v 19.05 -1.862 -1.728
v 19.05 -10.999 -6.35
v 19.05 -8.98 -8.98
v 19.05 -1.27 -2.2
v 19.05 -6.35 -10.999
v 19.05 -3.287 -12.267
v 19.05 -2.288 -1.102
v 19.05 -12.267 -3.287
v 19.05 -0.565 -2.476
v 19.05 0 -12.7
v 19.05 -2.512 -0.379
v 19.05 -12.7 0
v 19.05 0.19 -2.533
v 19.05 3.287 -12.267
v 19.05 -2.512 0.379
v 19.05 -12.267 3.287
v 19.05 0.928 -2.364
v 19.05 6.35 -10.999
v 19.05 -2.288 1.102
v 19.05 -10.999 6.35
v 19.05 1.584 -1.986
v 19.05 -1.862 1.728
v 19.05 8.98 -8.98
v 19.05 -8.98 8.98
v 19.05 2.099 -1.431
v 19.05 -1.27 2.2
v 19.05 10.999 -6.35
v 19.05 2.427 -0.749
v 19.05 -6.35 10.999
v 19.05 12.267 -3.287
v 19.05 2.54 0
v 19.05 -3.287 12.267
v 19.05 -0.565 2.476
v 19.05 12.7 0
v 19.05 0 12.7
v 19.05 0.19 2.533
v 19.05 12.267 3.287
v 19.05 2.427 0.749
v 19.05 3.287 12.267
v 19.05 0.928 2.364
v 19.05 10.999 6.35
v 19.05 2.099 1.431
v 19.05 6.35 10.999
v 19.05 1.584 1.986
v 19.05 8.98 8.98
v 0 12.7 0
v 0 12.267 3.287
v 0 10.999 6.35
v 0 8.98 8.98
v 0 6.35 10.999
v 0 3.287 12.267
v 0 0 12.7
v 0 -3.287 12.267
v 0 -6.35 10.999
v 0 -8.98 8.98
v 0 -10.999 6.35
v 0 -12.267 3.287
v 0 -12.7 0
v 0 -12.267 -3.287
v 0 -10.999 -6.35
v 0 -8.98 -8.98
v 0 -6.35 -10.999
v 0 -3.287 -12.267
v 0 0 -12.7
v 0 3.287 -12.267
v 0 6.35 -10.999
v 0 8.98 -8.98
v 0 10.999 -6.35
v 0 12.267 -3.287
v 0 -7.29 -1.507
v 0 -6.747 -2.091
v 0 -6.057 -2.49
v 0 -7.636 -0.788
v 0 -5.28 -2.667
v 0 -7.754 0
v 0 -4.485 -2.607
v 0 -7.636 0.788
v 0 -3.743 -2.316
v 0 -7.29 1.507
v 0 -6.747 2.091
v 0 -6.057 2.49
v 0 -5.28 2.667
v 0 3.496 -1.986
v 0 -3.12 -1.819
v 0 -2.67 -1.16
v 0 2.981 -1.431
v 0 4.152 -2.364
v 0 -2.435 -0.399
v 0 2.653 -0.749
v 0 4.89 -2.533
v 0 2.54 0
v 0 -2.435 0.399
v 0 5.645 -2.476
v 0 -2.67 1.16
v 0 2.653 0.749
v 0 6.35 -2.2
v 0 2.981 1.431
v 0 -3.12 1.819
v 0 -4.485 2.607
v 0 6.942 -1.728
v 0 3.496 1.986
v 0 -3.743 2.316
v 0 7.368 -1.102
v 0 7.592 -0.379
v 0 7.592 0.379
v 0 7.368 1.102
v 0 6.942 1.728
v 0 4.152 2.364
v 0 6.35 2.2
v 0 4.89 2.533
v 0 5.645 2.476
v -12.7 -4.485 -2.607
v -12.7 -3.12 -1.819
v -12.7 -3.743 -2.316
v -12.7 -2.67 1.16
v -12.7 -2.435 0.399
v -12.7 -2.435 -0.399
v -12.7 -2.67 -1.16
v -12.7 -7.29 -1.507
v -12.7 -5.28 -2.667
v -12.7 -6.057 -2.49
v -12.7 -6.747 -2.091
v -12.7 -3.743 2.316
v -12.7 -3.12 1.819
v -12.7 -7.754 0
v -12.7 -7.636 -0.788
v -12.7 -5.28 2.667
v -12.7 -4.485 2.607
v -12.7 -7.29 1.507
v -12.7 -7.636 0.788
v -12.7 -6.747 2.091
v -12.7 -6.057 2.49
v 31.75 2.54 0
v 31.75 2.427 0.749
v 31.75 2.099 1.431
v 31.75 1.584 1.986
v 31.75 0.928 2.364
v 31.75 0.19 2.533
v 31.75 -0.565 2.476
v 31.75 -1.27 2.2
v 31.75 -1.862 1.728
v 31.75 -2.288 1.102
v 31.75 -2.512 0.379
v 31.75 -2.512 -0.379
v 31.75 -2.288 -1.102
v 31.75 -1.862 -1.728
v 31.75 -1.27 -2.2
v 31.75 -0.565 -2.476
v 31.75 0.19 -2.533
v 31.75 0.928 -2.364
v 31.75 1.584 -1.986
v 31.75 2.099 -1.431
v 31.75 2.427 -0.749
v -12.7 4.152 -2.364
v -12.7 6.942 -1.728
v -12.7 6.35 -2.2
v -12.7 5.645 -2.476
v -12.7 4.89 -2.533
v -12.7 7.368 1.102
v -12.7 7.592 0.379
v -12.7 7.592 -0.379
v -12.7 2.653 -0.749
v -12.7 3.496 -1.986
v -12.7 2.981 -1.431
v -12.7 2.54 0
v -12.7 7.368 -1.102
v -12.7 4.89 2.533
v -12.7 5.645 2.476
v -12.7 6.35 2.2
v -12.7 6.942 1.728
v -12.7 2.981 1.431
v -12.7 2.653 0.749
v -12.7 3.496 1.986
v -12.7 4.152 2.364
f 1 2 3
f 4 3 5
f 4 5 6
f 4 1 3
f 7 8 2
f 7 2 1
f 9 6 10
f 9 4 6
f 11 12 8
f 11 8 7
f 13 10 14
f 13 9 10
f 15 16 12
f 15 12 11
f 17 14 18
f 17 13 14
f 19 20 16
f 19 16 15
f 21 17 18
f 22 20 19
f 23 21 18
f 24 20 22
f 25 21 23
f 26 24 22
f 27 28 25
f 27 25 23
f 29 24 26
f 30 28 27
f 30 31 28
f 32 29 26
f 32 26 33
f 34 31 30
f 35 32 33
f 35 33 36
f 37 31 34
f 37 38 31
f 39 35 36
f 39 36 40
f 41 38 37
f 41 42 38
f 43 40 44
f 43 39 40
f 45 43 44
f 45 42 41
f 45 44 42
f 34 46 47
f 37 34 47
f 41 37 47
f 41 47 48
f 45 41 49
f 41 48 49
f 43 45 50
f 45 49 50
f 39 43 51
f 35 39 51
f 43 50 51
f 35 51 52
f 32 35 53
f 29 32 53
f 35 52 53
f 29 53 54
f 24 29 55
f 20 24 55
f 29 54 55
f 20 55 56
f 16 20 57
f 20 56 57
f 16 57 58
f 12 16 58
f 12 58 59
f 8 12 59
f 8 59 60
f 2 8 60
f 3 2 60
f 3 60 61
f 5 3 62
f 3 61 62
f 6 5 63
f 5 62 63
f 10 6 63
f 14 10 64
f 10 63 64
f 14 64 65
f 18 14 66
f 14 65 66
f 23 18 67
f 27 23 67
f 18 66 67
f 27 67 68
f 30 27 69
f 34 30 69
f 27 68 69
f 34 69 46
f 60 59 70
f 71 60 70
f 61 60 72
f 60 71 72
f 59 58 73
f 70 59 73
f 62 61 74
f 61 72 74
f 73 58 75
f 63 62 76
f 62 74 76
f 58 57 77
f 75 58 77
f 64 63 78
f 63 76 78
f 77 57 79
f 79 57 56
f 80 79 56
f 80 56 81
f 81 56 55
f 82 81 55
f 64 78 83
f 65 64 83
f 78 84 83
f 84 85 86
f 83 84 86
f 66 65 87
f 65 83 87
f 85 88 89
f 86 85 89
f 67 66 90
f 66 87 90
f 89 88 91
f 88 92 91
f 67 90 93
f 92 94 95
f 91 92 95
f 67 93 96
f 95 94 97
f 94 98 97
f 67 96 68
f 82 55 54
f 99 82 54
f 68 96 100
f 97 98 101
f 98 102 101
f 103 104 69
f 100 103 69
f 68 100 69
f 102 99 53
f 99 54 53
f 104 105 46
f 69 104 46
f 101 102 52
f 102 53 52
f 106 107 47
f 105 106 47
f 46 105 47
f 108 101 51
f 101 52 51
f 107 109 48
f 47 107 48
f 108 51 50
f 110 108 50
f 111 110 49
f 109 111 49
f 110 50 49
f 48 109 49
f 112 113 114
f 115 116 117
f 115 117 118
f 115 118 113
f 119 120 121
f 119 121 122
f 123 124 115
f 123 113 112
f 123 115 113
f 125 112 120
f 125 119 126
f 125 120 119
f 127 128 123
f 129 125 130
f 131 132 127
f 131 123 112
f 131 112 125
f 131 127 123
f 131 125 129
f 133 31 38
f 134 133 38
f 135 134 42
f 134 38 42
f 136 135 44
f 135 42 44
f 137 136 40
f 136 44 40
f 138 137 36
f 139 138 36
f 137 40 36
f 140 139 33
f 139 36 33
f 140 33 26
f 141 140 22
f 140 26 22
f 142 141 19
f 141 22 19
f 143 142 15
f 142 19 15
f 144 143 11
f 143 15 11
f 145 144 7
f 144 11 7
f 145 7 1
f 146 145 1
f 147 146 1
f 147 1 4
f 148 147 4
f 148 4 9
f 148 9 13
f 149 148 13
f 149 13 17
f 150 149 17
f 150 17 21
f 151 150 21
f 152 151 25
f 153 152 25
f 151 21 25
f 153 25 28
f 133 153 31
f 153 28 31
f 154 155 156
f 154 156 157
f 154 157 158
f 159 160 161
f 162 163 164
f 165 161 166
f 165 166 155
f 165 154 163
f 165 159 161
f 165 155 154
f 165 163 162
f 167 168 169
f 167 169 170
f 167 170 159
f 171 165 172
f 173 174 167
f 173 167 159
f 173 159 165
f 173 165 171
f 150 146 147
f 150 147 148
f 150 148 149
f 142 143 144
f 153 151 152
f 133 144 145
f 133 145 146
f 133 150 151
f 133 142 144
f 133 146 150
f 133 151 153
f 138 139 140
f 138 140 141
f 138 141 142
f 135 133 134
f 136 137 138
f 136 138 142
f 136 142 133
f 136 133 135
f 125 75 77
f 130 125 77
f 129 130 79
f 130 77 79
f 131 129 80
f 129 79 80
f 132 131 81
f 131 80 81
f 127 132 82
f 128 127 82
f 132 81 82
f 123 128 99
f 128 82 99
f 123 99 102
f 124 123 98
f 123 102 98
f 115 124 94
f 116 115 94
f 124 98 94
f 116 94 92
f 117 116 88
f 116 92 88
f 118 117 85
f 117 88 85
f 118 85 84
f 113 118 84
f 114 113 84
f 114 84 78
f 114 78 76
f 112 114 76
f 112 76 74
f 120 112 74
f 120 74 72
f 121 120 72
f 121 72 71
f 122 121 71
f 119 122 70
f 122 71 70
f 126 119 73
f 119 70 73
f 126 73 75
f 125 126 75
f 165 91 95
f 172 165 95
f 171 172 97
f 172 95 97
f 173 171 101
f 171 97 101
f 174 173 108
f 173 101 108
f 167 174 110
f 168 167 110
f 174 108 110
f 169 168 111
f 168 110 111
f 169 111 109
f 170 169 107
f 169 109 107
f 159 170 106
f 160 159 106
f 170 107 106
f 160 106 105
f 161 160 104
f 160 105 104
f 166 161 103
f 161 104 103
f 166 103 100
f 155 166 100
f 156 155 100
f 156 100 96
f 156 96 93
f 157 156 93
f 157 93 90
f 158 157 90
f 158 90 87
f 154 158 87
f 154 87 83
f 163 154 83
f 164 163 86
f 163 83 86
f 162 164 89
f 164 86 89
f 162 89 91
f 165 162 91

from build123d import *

# Parameters (mm, degrees)
F0_R     = 12.7
F1_DEPTH = 19.05
F2_R     = 2.54
F3_DEPTH = 12.7
F4_R     = 2.54
F4_R_2   = 2.674386
F5_DEPTH = 12.7


with BuildPart() as f1:
    # F0 (on Right) → F1 (new body)
    with BuildSketch(Plane.YZ):
        Circle(F0_R)
    extrude(amount=F1_DEPTH)

    # F2 (on face) → F3 (join)
    with BuildSketch(Plane.YZ.offset(19.05)):
        Circle(F2_R)
    extrude(amount=F3_DEPTH)

    # F4 (on face) → F5 (join)
    with BuildSketch(Plane(origin=(0, 0, 0), x_dir=(0, -1, 0), z_dir=(-1, 0, 0))):
        with Locations((-5.08, 0)):
            Circle(F4_R)
        with Locations((5.08, 0)):
            Circle(F4_R_2)
    extrude(amount=F5_DEPTH)


solid = f1.part
